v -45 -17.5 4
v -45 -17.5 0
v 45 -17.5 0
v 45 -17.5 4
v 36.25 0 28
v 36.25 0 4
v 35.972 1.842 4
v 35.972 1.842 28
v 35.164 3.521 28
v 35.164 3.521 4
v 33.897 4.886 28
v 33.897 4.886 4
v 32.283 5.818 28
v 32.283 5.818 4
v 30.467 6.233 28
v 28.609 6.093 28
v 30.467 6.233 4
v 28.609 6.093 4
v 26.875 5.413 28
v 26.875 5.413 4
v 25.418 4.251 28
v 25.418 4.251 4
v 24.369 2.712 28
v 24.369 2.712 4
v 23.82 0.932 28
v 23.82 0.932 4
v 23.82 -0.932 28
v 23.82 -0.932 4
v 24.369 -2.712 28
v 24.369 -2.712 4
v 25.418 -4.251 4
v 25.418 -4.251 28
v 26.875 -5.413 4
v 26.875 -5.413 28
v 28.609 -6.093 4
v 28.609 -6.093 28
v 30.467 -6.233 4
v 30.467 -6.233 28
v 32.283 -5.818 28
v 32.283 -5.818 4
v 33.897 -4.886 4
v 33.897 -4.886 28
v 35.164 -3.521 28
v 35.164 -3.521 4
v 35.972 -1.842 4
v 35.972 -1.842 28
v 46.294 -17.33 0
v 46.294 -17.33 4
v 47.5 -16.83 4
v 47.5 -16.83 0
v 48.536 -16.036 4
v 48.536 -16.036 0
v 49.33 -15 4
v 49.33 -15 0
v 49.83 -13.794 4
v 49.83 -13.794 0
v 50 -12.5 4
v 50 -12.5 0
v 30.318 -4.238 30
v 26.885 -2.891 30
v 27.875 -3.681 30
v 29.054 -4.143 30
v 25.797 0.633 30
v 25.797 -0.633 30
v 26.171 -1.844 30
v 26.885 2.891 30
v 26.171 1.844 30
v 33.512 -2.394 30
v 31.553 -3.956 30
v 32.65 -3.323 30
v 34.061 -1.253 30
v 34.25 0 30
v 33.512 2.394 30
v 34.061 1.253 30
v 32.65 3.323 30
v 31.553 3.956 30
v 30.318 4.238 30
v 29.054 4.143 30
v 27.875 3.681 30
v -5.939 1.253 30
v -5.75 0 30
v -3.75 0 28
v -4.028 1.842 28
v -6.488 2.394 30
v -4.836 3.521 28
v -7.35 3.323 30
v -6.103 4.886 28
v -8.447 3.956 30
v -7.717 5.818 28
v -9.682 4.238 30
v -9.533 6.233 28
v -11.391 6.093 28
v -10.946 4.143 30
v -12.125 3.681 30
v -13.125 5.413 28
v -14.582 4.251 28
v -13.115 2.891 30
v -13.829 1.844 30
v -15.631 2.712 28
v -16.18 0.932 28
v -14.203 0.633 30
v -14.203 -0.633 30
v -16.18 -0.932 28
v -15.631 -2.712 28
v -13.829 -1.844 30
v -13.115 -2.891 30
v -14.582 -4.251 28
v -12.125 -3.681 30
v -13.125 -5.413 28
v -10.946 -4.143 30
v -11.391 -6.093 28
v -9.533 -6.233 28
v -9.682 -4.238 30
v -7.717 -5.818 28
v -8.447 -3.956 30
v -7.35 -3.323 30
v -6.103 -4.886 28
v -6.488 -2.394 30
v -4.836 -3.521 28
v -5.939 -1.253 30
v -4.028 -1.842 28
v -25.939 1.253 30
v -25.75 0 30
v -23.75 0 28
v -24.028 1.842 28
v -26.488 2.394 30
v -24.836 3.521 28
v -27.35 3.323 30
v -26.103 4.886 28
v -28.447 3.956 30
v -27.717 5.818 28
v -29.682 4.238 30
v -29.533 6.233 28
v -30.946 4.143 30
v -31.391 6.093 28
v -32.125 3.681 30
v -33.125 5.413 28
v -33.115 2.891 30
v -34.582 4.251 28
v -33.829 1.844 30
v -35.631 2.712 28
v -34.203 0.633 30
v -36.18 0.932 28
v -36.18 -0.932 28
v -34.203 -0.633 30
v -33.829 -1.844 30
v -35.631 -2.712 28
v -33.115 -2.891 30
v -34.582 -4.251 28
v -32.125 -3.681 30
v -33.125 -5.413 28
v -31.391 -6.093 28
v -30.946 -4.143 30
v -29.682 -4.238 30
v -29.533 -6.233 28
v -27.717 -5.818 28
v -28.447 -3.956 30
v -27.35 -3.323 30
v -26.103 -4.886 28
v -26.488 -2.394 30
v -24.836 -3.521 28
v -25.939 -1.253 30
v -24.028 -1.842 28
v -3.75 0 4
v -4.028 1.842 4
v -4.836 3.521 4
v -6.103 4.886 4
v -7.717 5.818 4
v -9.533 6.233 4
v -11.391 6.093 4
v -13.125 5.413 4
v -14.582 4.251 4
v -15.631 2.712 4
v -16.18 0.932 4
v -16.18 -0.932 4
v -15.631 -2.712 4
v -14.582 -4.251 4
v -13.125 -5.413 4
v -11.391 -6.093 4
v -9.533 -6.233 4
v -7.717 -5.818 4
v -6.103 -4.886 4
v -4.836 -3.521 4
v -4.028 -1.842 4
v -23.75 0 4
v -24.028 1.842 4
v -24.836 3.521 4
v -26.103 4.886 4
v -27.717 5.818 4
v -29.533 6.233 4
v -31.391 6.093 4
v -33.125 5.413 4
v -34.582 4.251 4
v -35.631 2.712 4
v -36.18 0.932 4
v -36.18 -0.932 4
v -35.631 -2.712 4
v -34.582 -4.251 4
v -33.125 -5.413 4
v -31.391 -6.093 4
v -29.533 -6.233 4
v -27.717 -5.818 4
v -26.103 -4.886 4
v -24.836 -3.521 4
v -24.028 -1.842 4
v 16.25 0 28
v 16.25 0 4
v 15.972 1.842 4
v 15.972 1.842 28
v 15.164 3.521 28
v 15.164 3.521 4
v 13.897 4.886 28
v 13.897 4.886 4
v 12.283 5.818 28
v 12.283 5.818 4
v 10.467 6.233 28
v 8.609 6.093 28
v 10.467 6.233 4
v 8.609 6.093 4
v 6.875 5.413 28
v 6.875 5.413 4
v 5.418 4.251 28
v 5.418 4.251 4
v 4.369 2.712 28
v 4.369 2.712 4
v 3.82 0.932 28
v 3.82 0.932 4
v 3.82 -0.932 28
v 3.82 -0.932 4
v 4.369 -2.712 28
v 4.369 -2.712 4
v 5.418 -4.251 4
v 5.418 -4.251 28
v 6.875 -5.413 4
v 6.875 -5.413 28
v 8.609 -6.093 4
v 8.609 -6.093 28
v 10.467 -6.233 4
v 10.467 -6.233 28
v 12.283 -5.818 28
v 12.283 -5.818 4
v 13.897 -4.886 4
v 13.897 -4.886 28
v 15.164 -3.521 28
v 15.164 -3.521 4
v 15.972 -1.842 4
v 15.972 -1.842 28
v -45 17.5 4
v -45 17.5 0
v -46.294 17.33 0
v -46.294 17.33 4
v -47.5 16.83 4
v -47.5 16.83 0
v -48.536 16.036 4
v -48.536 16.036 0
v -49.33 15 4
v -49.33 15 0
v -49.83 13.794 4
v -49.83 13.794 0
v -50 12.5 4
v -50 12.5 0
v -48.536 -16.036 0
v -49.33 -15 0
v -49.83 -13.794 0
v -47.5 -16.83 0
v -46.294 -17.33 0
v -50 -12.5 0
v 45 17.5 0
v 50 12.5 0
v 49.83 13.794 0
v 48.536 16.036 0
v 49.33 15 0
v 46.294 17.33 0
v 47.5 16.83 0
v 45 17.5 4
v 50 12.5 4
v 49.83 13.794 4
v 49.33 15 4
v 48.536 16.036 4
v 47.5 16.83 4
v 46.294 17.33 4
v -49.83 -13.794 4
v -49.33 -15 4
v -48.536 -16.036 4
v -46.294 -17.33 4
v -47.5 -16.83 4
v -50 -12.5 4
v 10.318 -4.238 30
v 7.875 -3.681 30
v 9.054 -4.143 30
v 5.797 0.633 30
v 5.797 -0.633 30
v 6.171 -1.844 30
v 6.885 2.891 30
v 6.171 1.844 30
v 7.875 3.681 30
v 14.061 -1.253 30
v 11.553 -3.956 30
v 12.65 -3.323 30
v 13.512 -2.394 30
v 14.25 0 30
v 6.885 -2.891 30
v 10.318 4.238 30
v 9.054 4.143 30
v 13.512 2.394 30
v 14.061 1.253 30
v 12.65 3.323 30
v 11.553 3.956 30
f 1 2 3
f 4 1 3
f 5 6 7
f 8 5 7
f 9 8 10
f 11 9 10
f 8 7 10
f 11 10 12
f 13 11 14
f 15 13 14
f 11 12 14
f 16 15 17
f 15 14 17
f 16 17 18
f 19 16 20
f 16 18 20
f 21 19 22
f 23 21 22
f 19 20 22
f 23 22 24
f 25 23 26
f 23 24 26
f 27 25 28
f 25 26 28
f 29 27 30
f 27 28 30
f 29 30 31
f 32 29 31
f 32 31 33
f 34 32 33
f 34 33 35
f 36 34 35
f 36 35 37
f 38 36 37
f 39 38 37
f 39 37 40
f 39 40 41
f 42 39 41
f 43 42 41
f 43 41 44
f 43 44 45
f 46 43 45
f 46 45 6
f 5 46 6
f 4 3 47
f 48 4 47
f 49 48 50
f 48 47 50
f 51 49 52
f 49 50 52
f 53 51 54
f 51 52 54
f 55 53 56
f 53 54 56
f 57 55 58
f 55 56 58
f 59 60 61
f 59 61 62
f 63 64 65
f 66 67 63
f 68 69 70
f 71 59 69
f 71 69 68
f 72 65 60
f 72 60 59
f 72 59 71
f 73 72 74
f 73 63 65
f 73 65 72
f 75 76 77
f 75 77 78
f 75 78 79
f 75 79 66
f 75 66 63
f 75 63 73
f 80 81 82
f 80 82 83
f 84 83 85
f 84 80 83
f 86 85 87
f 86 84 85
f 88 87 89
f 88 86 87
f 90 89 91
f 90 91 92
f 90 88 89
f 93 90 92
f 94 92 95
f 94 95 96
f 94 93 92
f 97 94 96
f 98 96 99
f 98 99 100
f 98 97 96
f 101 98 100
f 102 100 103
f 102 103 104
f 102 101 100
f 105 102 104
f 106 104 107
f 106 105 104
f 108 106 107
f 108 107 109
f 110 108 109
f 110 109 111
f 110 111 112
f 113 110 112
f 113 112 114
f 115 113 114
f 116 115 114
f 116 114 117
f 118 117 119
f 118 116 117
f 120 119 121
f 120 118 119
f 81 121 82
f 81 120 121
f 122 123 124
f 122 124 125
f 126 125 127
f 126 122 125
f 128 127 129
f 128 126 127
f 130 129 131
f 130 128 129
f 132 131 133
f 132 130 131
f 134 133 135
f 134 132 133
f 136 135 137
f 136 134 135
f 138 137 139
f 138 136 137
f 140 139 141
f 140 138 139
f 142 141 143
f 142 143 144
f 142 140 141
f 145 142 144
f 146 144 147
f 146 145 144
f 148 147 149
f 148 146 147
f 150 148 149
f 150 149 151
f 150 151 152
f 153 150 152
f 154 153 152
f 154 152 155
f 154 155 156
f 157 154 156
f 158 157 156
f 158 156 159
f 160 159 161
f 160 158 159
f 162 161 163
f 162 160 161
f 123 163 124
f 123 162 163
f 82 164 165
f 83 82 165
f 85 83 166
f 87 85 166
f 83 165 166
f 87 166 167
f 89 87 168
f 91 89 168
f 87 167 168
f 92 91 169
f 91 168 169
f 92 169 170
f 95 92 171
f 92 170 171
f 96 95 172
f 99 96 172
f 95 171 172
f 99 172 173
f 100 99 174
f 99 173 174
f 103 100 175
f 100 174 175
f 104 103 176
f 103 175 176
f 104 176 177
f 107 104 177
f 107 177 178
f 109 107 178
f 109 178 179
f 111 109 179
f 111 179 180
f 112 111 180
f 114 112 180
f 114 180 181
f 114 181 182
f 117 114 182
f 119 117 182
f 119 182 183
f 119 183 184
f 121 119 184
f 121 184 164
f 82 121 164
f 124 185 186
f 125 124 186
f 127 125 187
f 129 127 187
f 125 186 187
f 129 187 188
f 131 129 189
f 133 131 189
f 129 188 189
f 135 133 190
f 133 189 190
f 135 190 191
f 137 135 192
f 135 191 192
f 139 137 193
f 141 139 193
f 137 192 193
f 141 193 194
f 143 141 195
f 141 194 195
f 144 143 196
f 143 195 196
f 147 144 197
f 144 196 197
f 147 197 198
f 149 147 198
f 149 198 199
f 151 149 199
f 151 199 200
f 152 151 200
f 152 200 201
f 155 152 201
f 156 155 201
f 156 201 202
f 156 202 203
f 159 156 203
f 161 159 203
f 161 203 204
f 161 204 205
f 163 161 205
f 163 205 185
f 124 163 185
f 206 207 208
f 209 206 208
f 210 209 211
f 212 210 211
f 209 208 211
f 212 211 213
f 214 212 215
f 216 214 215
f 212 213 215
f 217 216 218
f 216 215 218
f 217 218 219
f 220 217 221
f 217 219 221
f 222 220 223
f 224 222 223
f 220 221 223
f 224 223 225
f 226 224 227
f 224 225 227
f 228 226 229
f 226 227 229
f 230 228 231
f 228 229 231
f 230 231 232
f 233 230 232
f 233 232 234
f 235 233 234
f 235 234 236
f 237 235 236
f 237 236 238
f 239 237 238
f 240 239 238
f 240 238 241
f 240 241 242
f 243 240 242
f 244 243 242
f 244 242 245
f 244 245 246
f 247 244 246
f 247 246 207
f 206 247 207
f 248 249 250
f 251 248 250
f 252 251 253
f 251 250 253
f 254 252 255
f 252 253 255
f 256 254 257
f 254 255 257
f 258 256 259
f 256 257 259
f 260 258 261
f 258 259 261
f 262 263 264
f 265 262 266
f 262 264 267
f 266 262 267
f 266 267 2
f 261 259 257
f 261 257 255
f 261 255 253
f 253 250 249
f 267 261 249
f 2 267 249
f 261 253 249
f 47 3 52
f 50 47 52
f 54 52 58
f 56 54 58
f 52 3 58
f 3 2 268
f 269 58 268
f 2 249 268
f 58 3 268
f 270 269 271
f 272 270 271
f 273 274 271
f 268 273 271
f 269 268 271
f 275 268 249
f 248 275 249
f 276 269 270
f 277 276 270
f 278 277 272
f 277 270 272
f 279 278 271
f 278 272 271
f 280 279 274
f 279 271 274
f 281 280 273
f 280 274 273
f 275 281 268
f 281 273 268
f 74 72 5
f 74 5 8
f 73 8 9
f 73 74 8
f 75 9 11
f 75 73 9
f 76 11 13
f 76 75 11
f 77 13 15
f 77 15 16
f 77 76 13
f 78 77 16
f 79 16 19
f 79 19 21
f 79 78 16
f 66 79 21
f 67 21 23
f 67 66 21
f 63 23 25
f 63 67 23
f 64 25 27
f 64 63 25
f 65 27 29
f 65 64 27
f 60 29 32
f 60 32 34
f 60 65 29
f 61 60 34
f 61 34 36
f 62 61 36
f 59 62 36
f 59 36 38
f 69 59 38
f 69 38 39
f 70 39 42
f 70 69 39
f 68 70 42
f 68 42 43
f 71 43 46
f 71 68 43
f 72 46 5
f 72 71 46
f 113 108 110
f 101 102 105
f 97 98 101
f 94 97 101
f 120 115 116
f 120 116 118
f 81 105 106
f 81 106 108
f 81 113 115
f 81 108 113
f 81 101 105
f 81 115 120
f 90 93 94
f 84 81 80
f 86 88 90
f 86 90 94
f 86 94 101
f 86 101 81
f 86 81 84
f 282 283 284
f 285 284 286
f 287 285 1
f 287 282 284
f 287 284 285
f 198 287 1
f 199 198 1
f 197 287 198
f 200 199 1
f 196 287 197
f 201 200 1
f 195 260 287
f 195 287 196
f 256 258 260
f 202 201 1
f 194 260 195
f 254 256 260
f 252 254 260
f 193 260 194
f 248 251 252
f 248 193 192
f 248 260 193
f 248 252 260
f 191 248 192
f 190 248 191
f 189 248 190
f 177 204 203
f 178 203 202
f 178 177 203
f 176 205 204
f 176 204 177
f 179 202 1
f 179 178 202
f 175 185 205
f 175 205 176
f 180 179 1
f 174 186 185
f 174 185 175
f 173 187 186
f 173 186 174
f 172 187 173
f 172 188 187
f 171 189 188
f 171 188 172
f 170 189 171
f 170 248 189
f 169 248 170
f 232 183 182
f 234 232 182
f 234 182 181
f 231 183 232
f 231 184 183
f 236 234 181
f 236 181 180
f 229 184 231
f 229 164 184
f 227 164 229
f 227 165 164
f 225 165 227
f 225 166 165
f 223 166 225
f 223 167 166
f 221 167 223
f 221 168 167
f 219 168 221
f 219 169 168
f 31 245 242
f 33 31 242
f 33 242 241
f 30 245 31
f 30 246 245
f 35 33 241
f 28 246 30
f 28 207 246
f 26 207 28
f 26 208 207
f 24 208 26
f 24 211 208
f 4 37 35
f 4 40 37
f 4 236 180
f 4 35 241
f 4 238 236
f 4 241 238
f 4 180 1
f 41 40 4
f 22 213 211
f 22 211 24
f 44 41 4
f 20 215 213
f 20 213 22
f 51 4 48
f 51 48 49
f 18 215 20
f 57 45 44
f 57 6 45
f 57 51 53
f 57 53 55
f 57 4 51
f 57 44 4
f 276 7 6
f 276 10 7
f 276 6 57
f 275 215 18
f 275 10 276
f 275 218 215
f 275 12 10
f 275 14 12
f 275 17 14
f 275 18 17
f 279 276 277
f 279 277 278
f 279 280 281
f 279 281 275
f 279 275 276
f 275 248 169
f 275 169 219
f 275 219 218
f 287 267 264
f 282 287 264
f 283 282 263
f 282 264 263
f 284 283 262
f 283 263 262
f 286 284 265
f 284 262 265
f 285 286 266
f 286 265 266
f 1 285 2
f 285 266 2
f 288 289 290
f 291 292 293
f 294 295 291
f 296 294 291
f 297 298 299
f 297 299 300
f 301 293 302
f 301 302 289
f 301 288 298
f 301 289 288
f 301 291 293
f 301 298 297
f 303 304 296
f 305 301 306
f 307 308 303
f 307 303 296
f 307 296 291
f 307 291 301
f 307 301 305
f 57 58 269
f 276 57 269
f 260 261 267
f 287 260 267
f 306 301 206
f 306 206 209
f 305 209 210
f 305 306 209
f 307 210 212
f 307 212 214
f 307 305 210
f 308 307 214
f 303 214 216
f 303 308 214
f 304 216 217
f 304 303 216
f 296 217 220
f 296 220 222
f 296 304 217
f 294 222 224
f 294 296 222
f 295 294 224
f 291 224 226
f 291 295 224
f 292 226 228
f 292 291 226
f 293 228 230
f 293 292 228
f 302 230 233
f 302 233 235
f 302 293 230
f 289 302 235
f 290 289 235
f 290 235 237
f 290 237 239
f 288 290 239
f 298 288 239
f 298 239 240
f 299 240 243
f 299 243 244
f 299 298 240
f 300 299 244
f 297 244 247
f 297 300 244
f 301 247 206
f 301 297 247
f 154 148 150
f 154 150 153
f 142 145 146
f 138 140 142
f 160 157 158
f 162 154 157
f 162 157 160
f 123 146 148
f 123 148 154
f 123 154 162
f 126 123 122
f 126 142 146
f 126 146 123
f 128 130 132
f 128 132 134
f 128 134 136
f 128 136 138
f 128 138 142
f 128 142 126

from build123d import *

# Parameters (mm, degrees)
F0_R     = 6.25
F1_DEPTH = 30
F2_DEPTH = 4
F3_SIZE  = 2


with BuildPart() as f1:
    # F0 (on Top) → F1 (new body)
    with BuildSketch(Plane.XY):
        with Locations((-30, 0)):
            Circle(F0_R)
        with Locations((-10, 0)):
            Circle(F0_R)
        with Locations((10, 0)):
            Circle(F0_R)
        with Locations((30, 0)):
            Circle(F0_R)
    extrude(amount=F1_DEPTH)

    # F0 (on Top) → F2 (join)
    with BuildSketch(Plane.XY):
        with BuildLine():
            ThreePointArc((50, 12.5), (48.535534, 16.035534), (45, 17.5))
            Line((45, 17.5), (-45, 17.5))
            ThreePointArc((-45, 17.5), (-48.535534, 16.035534), (-50, 12.5))
            Line((-50, 12.5), (-50, -12.5))
            ThreePointArc((-50, -12.5), (-48.535534, -16.035534), (-45, -17.5))
            Line((-45, -17.5), (45, -17.5))
            ThreePointArc((45, -17.5), (48.535534, -16.035534), (50, -12.5))
            Line((50, -12.5), (50, 12.5))
        make_face()
        with Locations((-30, 0)):
            Circle(F0_R, mode=Mode.SUBTRACT)
        with Locations((-10, 0)):
            Circle(F0_R, mode=Mode.SUBTRACT)
        with Locations((10, 0)):
            Circle(F0_R, mode=Mode.SUBTRACT)
        with Locations((30, 0)):
            Circle(F0_R, mode=Mode.SUBTRACT)
    extrude(amount=F2_DEPTH)

    # F3
    f3_edges = [f1.edges().sort_by_distance(p)[0] for p in [
        (-36.25, 0, 30),
        (-16.25, 0, 30),
        (3.75, 0, 30),
        (23.75, 0, 30),
    ]]
    chamfer(f3_edges, length=F3_SIZE)


solid = f1.part
